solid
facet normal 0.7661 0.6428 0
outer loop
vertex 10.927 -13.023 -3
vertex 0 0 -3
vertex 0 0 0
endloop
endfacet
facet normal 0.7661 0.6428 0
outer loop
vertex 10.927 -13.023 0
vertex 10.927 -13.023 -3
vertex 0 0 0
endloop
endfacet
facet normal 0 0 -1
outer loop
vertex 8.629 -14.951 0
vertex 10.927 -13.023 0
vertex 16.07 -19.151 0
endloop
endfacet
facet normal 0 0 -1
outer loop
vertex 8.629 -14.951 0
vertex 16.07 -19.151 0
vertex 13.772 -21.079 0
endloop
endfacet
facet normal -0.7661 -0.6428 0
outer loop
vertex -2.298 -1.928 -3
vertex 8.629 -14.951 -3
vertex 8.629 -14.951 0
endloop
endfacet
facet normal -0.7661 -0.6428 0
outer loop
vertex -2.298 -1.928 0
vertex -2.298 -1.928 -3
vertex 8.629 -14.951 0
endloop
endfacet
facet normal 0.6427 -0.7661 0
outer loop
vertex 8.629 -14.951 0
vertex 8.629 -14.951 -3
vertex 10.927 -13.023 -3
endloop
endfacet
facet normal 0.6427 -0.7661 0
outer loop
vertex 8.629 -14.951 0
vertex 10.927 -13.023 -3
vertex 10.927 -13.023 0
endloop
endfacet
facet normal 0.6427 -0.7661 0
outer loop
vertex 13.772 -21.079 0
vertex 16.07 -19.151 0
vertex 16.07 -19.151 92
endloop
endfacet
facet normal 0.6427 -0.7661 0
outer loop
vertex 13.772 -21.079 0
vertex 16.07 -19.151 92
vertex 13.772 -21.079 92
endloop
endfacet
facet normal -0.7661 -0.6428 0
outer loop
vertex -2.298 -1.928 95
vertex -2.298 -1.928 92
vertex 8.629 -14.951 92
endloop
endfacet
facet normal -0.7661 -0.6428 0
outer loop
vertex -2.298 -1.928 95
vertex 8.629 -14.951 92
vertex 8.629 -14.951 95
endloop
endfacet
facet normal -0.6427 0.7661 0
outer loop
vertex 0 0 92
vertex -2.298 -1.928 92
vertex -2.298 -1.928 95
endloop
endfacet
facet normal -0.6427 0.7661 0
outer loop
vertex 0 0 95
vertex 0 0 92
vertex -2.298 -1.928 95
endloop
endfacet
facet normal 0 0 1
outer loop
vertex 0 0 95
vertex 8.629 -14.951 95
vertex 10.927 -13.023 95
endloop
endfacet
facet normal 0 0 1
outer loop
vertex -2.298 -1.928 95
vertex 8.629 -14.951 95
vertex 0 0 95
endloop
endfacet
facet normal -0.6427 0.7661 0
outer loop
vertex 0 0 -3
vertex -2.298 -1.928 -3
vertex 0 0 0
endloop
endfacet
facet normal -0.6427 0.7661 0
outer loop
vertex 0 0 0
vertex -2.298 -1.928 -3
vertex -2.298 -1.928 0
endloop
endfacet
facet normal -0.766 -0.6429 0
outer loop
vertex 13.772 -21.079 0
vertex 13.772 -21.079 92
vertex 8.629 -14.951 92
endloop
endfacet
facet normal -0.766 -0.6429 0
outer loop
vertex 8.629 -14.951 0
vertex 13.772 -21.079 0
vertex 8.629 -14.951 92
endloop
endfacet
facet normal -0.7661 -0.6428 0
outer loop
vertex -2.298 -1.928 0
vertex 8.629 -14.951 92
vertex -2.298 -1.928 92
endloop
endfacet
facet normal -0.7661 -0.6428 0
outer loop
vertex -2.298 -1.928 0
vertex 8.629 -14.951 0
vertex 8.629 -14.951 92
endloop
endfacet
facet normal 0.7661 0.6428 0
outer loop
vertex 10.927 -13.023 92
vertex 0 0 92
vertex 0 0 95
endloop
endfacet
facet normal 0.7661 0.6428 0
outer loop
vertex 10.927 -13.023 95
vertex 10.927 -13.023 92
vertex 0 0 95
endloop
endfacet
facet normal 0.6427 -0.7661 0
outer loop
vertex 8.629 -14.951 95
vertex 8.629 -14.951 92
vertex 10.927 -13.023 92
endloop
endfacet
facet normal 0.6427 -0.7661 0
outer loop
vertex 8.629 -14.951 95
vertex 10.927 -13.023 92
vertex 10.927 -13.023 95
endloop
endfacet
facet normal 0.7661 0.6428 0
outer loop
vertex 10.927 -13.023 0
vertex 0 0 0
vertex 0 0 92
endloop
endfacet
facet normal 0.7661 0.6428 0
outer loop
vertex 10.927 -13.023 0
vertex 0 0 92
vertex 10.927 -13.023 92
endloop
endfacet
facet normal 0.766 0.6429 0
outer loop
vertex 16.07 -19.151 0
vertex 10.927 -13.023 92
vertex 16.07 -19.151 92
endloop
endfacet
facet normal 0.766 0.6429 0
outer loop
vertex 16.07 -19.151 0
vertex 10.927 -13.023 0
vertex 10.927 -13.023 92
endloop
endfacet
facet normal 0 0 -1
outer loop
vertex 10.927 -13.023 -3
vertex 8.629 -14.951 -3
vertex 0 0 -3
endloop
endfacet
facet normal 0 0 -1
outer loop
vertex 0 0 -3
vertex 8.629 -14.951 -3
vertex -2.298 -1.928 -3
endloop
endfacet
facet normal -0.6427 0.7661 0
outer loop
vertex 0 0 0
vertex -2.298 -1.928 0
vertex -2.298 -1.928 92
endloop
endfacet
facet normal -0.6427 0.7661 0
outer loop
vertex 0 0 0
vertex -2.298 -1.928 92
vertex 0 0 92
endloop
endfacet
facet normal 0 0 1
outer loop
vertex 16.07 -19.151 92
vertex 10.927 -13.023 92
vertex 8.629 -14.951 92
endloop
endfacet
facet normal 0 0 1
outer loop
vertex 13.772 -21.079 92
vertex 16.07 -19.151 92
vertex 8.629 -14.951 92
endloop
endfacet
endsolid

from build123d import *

# Parameters (mm, degrees)
SALIENTE_EXTRUIR1_DEPTH = 92
CROQUIS3_W              = 3
CROQUIS3_H              = 17
SALIENTE_EXTRUIR2_DEPTH = 3


with BuildPart() as part:
    # Croquis1 → Saliente-Extruir1 (new body)
    with BuildSketch(Plane.XY):
        Polygon((0, 0), (16.069690242, -19.151111078), (13.771556913, -21.079473907), (-2.298133329, -1.928362829), align=None)
    extrude(amount=SALIENTE_EXTRUIR1_DEPTH)

    # Croquis3 → Saliente-Extruir2 (add)
    with BuildSketch(Plane(origin=(-2.298133329, -1.928362829, 0), x_dir=(0, 0, 1), z_dir=(-0.7660444431189819, -0.6427876096865347, 0))):
        with Locations((93.5, -8.5)):
            Rectangle(CROQUIS3_W, CROQUIS3_H)
        with Locations((-1.5, -8.5)):
            Rectangle(CROQUIS3_W, CROQUIS3_H)
    extrude(amount=-SALIENTE_EXTRUIR2_DEPTH)


solid = part.part
